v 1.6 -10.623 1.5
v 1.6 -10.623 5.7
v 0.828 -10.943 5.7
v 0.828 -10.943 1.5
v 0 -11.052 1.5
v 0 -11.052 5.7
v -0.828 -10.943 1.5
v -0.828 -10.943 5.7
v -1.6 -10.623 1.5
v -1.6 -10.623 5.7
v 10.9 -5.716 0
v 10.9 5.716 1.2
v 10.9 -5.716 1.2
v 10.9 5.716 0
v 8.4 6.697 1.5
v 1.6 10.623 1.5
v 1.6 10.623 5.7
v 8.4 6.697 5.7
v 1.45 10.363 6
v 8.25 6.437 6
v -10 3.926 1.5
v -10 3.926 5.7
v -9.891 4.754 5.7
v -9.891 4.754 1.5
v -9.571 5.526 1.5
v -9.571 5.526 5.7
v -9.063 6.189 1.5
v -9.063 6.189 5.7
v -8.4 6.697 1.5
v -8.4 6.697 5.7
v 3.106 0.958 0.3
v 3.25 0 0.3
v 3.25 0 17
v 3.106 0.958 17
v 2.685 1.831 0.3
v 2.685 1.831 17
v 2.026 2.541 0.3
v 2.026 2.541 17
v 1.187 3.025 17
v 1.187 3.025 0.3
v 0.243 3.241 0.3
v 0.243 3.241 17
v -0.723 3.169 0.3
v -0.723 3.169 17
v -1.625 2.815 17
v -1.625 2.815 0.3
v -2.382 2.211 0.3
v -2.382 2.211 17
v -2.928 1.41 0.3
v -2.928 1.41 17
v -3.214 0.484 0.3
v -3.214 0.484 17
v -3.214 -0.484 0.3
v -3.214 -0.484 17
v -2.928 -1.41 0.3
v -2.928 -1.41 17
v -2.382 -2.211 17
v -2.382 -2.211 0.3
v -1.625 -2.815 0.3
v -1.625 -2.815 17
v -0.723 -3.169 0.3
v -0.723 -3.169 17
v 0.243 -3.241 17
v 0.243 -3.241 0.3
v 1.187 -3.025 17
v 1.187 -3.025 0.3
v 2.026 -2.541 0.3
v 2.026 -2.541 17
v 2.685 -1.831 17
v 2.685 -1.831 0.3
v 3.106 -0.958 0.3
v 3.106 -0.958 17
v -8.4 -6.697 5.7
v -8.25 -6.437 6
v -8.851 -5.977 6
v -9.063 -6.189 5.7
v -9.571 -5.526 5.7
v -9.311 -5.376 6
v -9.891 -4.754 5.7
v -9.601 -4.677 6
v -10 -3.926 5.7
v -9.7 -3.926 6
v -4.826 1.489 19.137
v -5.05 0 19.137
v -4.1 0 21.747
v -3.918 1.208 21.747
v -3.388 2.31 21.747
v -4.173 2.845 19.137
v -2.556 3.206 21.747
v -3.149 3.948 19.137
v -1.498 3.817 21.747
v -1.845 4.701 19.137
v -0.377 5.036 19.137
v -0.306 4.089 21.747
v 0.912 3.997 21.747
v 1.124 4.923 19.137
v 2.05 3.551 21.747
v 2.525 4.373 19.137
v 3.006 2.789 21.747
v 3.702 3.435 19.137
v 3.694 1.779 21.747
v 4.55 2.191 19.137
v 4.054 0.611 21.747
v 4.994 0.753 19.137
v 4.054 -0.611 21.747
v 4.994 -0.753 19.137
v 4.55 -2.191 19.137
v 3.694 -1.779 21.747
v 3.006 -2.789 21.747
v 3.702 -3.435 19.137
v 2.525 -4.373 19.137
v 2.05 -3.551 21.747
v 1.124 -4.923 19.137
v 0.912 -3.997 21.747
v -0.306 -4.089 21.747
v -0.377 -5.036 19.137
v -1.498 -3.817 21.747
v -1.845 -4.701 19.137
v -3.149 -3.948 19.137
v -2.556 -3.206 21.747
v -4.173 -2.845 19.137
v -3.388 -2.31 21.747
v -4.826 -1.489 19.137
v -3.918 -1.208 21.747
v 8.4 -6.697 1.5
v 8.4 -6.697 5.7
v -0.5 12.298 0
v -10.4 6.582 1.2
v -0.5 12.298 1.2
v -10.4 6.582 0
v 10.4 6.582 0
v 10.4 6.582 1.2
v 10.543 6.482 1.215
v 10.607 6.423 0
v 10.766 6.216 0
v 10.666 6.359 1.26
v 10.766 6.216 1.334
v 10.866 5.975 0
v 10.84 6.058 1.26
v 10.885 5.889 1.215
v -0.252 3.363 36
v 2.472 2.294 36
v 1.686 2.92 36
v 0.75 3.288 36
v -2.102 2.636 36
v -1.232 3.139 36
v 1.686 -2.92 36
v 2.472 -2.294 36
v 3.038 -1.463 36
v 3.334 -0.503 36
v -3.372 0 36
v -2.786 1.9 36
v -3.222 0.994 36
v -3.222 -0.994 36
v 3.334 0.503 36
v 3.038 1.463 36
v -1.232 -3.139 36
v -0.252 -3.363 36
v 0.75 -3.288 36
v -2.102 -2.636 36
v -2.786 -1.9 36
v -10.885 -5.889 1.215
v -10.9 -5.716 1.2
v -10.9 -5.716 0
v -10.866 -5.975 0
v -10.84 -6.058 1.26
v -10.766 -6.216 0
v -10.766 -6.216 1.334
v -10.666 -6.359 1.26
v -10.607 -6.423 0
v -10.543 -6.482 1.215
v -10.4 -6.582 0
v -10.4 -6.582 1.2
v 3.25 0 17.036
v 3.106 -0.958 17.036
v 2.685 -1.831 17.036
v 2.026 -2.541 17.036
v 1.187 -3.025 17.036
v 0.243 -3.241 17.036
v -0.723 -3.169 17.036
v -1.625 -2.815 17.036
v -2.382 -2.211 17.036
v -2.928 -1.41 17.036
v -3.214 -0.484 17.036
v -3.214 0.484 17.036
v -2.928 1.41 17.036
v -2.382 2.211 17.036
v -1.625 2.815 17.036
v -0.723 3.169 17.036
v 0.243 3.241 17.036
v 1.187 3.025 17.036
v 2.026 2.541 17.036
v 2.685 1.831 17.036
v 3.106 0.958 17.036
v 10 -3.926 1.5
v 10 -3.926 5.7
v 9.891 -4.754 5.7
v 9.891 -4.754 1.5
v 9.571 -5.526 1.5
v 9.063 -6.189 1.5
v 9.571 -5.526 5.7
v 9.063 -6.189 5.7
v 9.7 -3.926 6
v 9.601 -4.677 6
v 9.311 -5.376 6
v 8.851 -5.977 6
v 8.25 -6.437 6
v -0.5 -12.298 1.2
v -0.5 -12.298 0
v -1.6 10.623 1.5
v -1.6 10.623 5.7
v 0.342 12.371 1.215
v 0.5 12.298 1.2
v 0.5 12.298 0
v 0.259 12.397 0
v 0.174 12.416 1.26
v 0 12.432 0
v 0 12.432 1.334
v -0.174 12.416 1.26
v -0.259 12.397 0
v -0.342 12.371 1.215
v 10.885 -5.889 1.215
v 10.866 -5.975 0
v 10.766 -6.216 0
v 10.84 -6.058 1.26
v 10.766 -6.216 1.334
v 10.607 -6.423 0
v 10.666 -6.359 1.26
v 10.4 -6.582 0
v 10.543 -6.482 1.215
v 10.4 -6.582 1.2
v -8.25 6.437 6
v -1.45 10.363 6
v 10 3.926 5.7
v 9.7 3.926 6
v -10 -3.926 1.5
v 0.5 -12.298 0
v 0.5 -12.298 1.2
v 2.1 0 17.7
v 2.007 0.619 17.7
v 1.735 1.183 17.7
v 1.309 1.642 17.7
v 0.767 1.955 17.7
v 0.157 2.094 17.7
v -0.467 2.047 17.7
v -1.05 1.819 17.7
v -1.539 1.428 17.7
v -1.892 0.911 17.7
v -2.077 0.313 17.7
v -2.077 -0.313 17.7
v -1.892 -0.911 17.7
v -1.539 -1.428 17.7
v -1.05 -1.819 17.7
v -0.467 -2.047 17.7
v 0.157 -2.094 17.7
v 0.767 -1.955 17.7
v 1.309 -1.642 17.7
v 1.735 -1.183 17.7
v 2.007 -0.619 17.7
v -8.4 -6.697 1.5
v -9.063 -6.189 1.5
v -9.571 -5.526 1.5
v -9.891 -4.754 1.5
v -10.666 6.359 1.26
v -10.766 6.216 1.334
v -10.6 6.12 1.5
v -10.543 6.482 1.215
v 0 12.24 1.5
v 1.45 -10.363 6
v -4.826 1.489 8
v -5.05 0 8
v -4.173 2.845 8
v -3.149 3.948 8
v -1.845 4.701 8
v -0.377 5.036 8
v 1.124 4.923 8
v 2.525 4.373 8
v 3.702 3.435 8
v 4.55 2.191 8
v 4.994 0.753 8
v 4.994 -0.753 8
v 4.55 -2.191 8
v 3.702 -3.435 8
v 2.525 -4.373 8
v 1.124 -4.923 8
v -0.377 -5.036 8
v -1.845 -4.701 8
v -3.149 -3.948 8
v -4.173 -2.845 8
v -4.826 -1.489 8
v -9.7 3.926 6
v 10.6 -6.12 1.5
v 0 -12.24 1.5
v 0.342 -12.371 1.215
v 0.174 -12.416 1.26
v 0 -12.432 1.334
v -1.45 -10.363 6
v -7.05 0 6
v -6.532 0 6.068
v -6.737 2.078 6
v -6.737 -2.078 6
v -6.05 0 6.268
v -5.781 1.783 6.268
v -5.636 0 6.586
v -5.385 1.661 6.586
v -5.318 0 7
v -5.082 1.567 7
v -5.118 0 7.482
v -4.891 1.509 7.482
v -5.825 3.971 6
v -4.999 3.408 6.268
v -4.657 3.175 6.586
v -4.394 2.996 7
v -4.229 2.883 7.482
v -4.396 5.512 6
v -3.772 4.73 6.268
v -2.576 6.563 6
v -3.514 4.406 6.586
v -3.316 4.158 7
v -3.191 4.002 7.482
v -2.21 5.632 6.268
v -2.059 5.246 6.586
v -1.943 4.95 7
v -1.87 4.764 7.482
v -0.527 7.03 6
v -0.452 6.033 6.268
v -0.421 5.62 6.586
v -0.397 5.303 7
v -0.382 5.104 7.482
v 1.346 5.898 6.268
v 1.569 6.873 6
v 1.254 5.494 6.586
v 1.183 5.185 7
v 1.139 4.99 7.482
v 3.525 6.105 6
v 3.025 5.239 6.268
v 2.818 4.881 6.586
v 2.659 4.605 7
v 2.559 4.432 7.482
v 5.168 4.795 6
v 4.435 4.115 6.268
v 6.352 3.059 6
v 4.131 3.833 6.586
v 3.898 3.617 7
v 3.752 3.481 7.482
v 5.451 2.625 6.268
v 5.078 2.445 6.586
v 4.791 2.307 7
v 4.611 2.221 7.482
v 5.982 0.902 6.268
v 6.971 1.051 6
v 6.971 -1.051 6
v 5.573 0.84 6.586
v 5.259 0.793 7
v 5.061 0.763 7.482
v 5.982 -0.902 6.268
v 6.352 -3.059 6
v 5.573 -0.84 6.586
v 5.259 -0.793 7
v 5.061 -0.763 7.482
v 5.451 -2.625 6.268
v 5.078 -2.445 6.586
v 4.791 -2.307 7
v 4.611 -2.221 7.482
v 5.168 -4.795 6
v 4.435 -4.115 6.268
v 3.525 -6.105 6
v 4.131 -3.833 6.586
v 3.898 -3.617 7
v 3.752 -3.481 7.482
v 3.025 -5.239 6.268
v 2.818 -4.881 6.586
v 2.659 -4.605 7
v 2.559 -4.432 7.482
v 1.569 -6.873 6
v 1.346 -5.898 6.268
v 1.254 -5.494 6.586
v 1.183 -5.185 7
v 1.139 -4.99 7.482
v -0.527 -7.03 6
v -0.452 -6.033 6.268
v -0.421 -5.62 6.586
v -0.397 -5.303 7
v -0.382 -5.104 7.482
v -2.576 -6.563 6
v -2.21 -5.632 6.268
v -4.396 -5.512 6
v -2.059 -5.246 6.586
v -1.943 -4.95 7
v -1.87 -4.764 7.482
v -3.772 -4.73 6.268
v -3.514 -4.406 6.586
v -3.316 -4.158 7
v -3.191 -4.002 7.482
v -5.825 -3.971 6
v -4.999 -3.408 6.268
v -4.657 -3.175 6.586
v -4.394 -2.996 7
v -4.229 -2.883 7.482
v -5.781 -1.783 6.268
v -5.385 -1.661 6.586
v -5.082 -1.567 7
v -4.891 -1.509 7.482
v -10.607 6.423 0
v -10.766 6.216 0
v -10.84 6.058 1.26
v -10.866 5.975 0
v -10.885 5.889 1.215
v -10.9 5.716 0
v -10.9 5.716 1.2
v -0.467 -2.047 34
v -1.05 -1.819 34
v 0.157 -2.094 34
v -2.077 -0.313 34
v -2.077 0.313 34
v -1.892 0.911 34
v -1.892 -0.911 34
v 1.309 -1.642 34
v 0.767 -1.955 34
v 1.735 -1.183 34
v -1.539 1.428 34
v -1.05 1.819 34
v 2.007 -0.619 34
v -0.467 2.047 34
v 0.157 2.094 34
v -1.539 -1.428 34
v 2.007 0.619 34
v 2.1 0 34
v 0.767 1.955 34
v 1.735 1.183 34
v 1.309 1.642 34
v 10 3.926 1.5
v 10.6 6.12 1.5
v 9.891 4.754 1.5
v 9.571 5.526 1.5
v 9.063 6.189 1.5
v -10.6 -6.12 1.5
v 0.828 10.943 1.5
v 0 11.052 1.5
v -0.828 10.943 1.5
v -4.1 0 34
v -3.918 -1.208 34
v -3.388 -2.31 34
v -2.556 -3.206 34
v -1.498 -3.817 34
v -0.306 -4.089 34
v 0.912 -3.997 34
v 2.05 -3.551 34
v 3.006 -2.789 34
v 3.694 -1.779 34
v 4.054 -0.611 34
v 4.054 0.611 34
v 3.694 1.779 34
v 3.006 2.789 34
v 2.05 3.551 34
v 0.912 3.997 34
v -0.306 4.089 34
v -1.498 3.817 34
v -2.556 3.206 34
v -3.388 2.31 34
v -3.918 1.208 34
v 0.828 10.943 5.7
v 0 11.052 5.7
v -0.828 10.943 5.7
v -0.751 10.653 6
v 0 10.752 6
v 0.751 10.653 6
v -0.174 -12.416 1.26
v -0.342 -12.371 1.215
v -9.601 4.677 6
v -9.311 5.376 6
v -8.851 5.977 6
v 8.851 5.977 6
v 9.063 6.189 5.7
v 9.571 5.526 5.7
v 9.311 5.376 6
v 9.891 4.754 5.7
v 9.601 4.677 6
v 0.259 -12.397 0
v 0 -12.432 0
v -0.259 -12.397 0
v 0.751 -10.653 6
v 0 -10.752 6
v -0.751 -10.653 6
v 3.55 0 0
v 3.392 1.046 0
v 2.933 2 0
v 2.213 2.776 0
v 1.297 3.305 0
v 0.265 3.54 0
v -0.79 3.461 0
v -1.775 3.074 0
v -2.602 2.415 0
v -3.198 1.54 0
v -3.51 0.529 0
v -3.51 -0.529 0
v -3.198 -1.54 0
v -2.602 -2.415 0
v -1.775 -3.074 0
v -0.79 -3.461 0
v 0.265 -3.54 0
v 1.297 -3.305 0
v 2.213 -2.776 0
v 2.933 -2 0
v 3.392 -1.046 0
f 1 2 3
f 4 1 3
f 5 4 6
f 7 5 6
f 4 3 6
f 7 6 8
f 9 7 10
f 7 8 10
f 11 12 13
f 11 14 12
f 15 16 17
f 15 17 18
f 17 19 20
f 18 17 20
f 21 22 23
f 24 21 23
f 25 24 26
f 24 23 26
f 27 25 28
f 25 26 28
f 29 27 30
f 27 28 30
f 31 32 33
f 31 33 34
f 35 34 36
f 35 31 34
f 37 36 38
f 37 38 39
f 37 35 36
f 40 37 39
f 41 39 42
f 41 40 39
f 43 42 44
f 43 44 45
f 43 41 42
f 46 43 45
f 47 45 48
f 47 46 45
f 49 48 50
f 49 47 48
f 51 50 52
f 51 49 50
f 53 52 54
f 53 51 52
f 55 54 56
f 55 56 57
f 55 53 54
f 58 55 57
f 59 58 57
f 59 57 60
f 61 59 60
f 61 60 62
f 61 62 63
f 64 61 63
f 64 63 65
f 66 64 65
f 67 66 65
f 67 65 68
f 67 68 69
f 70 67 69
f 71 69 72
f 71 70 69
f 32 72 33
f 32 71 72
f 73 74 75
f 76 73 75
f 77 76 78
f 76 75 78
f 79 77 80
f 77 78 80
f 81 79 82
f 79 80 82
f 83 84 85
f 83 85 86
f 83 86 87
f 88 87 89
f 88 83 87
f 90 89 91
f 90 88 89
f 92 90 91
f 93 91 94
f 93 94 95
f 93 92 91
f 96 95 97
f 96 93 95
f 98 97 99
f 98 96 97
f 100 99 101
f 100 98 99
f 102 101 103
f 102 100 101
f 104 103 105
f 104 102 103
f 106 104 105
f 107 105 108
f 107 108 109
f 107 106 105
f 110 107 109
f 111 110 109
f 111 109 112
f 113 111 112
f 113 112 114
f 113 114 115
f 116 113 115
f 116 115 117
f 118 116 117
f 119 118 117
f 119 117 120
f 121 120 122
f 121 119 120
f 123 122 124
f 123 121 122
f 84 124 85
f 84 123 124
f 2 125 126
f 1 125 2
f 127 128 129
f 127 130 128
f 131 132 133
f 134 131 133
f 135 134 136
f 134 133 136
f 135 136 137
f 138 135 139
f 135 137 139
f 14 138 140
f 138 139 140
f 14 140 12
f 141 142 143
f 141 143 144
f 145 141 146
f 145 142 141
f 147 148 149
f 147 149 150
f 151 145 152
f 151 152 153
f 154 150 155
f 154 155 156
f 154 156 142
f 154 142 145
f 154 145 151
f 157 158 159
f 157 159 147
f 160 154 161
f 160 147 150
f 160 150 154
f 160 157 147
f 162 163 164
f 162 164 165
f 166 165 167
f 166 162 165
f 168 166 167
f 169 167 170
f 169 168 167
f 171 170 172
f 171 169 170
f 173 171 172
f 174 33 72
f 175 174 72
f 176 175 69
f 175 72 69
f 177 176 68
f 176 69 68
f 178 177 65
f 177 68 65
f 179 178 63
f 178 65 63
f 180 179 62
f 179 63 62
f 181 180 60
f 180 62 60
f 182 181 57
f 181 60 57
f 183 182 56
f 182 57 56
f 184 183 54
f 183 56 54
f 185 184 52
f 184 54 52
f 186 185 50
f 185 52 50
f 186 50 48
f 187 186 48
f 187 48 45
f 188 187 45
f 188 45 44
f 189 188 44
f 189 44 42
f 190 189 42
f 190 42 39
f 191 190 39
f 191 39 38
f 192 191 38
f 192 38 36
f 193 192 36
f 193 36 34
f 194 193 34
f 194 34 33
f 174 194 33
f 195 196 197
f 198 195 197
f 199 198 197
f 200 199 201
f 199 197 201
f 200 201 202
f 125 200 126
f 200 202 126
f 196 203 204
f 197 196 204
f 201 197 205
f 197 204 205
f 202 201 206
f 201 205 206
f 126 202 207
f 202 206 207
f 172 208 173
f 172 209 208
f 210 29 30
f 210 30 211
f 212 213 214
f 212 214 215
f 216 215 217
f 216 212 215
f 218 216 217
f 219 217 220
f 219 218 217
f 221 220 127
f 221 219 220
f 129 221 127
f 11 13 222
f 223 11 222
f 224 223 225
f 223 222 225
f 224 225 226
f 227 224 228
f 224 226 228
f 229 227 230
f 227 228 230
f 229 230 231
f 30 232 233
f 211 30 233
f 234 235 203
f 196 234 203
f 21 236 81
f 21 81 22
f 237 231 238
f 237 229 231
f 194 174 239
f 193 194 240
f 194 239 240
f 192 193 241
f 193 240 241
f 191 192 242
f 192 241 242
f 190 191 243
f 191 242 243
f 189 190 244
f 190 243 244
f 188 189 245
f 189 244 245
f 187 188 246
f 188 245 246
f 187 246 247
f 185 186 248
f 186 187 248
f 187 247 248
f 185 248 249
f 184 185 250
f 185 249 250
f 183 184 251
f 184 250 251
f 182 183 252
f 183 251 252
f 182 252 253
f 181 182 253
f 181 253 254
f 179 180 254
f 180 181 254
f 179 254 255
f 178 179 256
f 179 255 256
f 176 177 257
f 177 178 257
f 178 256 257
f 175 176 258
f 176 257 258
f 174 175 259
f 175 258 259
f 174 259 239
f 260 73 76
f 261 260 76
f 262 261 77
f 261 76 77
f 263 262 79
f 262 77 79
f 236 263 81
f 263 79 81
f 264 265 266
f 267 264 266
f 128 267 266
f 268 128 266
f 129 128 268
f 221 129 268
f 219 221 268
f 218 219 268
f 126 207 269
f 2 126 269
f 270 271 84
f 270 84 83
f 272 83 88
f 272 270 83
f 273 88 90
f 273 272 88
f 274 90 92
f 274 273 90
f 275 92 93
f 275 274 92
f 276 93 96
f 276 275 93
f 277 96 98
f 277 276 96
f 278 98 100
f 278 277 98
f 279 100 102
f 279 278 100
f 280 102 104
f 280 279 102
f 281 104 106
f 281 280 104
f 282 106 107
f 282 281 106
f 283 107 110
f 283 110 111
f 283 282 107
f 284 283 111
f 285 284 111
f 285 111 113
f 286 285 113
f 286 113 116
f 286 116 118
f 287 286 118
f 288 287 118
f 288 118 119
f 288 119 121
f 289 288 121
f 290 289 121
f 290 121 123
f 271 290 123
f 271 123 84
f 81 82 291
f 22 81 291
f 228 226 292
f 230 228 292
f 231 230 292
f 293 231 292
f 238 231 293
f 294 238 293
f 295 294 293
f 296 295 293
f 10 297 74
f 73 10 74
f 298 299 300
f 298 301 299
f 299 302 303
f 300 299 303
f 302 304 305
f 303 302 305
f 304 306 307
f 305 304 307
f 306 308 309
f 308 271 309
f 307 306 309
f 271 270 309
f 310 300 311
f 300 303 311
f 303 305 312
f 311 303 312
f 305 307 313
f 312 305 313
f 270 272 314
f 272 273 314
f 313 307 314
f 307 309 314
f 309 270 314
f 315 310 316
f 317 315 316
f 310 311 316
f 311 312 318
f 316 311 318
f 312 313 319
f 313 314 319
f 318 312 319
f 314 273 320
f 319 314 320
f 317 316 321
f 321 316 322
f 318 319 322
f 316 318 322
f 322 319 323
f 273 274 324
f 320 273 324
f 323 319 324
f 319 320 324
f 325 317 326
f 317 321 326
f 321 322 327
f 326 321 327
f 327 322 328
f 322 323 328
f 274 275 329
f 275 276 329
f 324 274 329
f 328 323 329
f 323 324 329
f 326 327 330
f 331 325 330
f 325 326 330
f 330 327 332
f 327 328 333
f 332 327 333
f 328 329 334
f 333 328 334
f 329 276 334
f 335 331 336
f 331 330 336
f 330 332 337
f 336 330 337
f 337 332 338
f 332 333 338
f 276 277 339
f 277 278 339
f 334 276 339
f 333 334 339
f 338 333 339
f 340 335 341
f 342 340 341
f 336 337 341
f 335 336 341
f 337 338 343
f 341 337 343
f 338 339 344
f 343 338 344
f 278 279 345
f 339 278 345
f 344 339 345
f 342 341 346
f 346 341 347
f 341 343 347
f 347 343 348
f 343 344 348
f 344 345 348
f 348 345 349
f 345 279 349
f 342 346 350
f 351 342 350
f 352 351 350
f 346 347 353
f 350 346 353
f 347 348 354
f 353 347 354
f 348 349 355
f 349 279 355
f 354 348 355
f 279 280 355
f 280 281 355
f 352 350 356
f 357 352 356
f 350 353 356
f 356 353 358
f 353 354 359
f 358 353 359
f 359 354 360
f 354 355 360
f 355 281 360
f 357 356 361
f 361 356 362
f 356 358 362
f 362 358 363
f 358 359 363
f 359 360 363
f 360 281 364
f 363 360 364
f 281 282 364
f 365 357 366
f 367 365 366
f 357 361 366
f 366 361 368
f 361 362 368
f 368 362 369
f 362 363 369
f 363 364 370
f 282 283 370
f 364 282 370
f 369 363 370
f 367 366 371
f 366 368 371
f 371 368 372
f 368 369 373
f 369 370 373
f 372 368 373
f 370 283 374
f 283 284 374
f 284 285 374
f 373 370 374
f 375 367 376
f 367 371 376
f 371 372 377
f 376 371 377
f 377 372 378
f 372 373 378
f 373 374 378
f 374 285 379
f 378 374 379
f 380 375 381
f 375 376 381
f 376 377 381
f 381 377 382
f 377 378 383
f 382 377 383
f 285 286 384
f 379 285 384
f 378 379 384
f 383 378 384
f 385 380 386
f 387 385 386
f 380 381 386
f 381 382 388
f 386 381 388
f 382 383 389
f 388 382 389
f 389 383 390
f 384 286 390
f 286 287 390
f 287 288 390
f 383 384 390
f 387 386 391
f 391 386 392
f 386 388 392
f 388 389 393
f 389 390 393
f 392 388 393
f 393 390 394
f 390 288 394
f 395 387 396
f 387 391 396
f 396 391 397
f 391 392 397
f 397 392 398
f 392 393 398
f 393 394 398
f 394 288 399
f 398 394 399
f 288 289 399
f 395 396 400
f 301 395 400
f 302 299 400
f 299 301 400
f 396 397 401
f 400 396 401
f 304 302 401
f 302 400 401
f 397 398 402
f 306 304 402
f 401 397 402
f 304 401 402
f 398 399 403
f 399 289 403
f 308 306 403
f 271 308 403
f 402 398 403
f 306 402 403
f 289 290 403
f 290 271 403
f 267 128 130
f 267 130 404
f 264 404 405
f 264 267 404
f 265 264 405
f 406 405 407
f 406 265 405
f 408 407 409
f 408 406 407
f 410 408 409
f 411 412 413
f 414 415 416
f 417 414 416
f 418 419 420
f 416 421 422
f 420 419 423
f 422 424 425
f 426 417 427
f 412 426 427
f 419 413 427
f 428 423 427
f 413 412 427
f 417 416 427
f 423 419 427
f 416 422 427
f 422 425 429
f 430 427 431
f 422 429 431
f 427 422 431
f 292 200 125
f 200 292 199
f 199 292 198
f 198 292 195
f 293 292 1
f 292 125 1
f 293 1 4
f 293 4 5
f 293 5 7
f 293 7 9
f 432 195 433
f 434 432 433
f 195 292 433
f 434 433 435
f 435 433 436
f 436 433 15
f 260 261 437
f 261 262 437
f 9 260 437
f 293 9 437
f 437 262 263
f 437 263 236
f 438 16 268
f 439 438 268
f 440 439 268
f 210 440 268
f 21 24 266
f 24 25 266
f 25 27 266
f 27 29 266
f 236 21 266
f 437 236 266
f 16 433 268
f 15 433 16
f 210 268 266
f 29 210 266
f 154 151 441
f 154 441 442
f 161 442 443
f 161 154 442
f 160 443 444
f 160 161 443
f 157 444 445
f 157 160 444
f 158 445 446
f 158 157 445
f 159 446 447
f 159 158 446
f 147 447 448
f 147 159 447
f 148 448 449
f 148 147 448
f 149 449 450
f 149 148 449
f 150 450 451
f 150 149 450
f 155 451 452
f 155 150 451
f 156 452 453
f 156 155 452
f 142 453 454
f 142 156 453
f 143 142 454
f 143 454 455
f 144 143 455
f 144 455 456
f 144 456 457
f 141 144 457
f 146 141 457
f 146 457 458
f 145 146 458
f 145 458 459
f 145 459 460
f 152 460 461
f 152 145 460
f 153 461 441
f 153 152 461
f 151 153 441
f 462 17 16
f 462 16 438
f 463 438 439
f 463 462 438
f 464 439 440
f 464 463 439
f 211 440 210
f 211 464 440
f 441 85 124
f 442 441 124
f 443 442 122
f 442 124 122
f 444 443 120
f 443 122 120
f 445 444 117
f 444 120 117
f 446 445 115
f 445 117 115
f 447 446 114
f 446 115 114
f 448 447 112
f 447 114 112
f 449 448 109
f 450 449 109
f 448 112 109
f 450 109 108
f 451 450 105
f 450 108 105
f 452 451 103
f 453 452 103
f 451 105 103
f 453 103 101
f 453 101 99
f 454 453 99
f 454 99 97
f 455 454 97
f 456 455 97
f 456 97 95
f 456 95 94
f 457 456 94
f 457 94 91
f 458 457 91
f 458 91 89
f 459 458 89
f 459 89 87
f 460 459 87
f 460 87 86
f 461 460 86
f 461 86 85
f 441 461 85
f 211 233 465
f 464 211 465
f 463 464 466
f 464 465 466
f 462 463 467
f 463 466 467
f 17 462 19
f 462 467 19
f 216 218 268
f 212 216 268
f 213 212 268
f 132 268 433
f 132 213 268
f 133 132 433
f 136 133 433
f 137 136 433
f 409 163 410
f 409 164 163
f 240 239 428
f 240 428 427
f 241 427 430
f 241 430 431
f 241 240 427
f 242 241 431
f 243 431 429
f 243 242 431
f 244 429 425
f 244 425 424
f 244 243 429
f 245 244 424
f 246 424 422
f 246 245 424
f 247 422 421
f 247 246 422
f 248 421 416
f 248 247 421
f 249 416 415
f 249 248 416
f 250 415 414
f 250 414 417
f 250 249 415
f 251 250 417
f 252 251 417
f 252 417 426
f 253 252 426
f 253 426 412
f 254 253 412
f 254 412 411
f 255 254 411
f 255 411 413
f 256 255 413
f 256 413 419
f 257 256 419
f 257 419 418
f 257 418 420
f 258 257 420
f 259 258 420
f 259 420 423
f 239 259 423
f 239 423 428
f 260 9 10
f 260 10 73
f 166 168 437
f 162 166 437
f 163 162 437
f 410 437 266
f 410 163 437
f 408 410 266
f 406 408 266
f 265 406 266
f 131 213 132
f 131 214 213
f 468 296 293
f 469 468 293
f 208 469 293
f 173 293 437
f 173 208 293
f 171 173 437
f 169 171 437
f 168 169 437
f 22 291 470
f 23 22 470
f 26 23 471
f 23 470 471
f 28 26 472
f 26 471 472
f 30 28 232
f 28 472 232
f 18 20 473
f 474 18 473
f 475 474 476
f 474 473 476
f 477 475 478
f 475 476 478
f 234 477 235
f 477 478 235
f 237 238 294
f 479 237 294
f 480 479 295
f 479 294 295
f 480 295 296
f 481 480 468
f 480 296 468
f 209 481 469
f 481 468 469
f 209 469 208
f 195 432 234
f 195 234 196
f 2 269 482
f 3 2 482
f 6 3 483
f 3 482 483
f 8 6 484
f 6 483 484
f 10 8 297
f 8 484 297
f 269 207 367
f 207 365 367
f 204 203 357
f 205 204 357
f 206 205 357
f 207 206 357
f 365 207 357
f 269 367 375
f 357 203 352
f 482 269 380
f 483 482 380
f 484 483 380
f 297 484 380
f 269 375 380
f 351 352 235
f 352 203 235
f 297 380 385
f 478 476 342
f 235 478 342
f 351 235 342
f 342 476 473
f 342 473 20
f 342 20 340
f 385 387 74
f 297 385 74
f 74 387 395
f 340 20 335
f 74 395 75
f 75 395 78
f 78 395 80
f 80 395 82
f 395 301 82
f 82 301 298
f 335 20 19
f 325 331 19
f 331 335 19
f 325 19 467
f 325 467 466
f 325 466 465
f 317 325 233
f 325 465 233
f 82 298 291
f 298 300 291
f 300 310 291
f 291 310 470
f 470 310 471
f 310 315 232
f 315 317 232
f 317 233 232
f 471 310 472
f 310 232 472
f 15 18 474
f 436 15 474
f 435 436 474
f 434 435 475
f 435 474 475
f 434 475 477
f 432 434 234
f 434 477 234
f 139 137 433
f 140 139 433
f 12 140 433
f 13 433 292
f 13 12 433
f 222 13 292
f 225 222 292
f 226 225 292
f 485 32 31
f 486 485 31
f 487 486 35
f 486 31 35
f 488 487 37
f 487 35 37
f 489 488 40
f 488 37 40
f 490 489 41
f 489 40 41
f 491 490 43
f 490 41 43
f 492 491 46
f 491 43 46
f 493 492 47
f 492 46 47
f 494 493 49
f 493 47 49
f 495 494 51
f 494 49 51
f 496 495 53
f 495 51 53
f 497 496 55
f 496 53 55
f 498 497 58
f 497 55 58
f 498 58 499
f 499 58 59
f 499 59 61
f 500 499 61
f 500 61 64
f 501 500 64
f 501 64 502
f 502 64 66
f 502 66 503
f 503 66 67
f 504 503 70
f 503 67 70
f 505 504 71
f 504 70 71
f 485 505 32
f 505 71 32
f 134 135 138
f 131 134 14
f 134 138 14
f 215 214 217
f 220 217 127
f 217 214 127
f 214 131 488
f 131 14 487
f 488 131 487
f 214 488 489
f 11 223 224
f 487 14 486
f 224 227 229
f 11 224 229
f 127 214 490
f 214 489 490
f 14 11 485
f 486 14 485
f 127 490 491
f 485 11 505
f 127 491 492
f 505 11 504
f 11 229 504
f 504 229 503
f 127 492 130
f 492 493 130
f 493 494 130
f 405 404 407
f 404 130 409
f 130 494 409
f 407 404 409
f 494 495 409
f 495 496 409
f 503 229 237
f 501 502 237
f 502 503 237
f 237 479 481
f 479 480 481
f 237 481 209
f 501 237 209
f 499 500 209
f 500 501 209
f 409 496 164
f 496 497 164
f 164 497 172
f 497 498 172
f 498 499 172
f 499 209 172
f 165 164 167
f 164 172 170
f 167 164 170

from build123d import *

# Parameters (mm, degrees)
BOSS_EXTRUDE1_DEPTH  = 1.5
SKETCH1_8_R          = 4.1
BOSS_EXTRUDE3_DEPTH  = 36
SKETCH1_9_R          = 5.05
BOSS_EXTRUDE4_DEPTH  = 19
SHELL1_START         = 2
SHELL1_OUTLINE_R     = 2.1
SHELL1_DEPTH         = 32
SHELL1_2_OUTLINE_R   = 3.05
SHELL1_2_OUTLINE_R_2 = 2.1
SHELL1_2_DEPTH       = 15
SKETCH1_10_R         = 3.25
CUT_EXTRUDE1_DEPTH   = 17
SKETCH1_3_R          = 3.25
BOSS_EXTRUDE2_DEPTH  = 6
CHAMFER1_SIZE        = 2
CHAMFER1_SIZE2       = 0.727940469
CHAMFER2_SIZE        = 2.747477419
CHAMFER2_SIZE_2      = 1
CHAMFER3_SIZE        = 1.212435565
CHAMFER3_SIZE_2      = 0.7
CHAMFER6_SIZE        = 0.3
FILLET1_R            = 3.2
CHAMFER5_SIZE        = 0.3
FILLET2_R            = 1
FILLET3_R            = 2


# Read off the part's stored shape, not the designer's step: Shell1
with BuildPart() as part:
    # Sketch1 → Boss-Extrude1 (new body)
    with BuildSketch(Plane.XY):
        Polygon((-10.9, 6.293117934), (0, 12.586235868), (10.9, 6.293117934), (10.9, -6.293117934), (0, -12.586235868), (-10.9, -6.293117934), align=None)
    extrude(amount=BOSS_EXTRUDE1_DEPTH)

    # Sketch1<8> → Boss-Extrude3 (add)
    with BuildSketch(Plane.XY):
        with Locations(Location((0, 0, 0), (0, 0, 180))):
            Circle(SKETCH1_8_R)
    extrude(amount=BOSS_EXTRUDE3_DEPTH)

    # Sketch1<9> → Boss-Extrude4 (add)
    with BuildSketch(Plane.XY):
        with Locations(Location((0, 0, 0), (0, 0, 180))):
            Circle(SKETCH1_9_R)
    extrude(amount=BOSS_EXTRUDE4_DEPTH)

    # Shell1 outline → Shell1 (cut)
    with BuildSketch(Plane.XY.offset(SHELL1_START)):
        Circle(SHELL1_OUTLINE_R)
    extrude(amount=SHELL1_DEPTH, mode=Mode.SUBTRACT)

    # Shell1 2 outline → Shell1 2 (cut)
    with BuildSketch(Plane.XY.offset(SHELL1_START)):
        Circle(SHELL1_2_OUTLINE_R)
        Circle(SHELL1_2_OUTLINE_R_2, mode=Mode.SUBTRACT)
    extrude(amount=SHELL1_2_DEPTH, mode=Mode.SUBTRACT)

    # Sketch1<10> → Cut-Extrude1 (cut)
    with BuildSketch(Plane.XY):
        Circle(SKETCH1_10_R)
    extrude(amount=CUT_EXTRUDE1_DEPTH, mode=Mode.SUBTRACT)

    # Sketch1<3> → Boss-Extrude2 (add)
    with BuildSketch(Plane.XY):
        Polygon((0, 11.547005384), (10, 5.773502692), (10, -5.773502692), (0, -11.547005384), (-10, -5.773502692), (-10, 5.773502692), align=None)
        Circle(SKETCH1_3_R, mode=Mode.SUBTRACT)
    extrude(amount=BOSS_EXTRUDE2_DEPTH)

    # Chamfer1
    chamfer1_edges = [part.edges().sort_by_distance(p)[0] for p in [
        (4.1, 0, 36),
    ]]
    chamfer1_side = [part.faces().sort_by_distance(p)[0] for p in [
        (4.1, 0, 27.5),
    ]]
    chamfer(chamfer1_edges, length=CHAMFER1_SIZE, length2=CHAMFER1_SIZE2, reference=chamfer1_side[0])

    # Chamfer2
    # the kernel refuses this chamfer: 2.747477419, 1 mm, written as the material it adds along each edge
    with BuildSketch(Plane(origin=(0, 0, 19), x_dir=(-1, 0, 0), z_dir=(0, -1, 0))) as chamfer2_piece_1_section:
        Polygon((4.1, -CHAMFER2_SIZE), (4.1 + CHAMFER2_SIZE_2, 0), (4.1, 0), align=None)
    chamfer2_piece_1 = revolve(axis=Axis((0, 0, 19), (0, 0, -1)), mode=Mode.PRIVATE)
    chamfer2_piece_1 = chamfer2_piece_1 & Plane(origin=(0, 0, 20.481947897), x_dir=(-1, 0, 0), z_dir=(0, 0, -1)) * Cylinder(5.05, 21, mode=Mode.PRIVATE)
    add(chamfer2_piece_1)

    # Chamfer3
    # the kernel refuses this chamfer: 1.212435565, 0.7 mm, written as the material it takes off along each edge
    with BuildSketch(Plane(origin=(0, 0, 17), x_dir=(1, 0, 0), z_dir=(0, -1, 0))) as chamfer3_piece_1_section:
        Polygon((2.1 + CHAMFER3_SIZE, 0), (2.1, CHAMFER3_SIZE_2), (2.1, 0), align=None)
    chamfer3_piece_1 = revolve(axis=Axis((0, 0, 17), (0, 0, 1)), mode=Mode.PRIVATE)
    chamfer3_piece_1 = chamfer3_piece_1 & Plane(origin=(0, 0, 17.363214185), x_dir=(1, 0, 0), z_dir=(0, 0, -1)) * Cylinder(3.25, 14, mode=Mode.PRIVATE)
    add(chamfer3_piece_1, mode=Mode.SUBTRACT)

    # Chamfer6
    chamfer6_edges = [part.edges().sort_by_distance(p)[0] for p in [
        (-3.25, 0, 0),
    ]]
    chamfer(chamfer6_edges, length=CHAMFER6_SIZE)

    # Fillet1
    fillet1_edges = [part.edges().sort_by_distance(p)[0] for p in [
        (-10, -5.773502692, 3.75),
        (0, -11.547005384, 3.75),
        (10, -5.773502692, 3.75),
        (10, 5.773502692, 3.75),
        (0, 11.547005384, 3.75),
        (-10, 5.773502692, 3.75),
    ]]
    fillet(fillet1_edges, radius=FILLET1_R)

    # Chamfer5
    chamfer5_edges = [part.edges().sort_by_distance(p)[0] for p in [
        (-5, -8.660254038, 6),
        (5, 8.660254038, 6),
        (-5, 8.660254038, 6),
        (-10, 0, 6),
        (9.571281292, 5.52598183, 6),
        (0, 11.051963661, 6),
        (-9.571281292, 5.52598183, 6),
        (-9.571281292, -5.52598183, 6),
        (0, -11.051963661, 6),
        (9.571281292, -5.52598183, 6),
        (5.45, 9.439676901, 1.5),
        (10.9, 0, 1.5),
        (5.45, -9.439676901, 1.5),
        (-5.45, -9.439676901, 1.5),
        (-10.9, 0, 1.5),
        (-5.45, 9.439676901, 1.5),
        (10, 0, 6),
        (5, -8.660254038, 6),
    ]]
    chamfer(chamfer5_edges, length=CHAMFER5_SIZE)

    # Fillet2
    fillet2_edges = [part.edges().sort_by_distance(p)[0] for p in [
        (10.9, 6.293117934, 0.6),
        (10.9, -6.293117934, 0.6),
        (0, -12.586235868, 0.6),
        (-10.9, -6.293117934, 0.6),
        (-10.9, 6.293117934, 0.6),
        (0, 12.586235868, 0.6),
    ]]
    fillet(fillet2_edges, radius=FILLET2_R)

    # Fillet3
    fillet3_edges = [part.edges().sort_by_distance(p)[0] for p in [
        (5.05, 0, 6),
    ]]
    fillet(fillet3_edges, radius=FILLET3_R)


solid = part.part
